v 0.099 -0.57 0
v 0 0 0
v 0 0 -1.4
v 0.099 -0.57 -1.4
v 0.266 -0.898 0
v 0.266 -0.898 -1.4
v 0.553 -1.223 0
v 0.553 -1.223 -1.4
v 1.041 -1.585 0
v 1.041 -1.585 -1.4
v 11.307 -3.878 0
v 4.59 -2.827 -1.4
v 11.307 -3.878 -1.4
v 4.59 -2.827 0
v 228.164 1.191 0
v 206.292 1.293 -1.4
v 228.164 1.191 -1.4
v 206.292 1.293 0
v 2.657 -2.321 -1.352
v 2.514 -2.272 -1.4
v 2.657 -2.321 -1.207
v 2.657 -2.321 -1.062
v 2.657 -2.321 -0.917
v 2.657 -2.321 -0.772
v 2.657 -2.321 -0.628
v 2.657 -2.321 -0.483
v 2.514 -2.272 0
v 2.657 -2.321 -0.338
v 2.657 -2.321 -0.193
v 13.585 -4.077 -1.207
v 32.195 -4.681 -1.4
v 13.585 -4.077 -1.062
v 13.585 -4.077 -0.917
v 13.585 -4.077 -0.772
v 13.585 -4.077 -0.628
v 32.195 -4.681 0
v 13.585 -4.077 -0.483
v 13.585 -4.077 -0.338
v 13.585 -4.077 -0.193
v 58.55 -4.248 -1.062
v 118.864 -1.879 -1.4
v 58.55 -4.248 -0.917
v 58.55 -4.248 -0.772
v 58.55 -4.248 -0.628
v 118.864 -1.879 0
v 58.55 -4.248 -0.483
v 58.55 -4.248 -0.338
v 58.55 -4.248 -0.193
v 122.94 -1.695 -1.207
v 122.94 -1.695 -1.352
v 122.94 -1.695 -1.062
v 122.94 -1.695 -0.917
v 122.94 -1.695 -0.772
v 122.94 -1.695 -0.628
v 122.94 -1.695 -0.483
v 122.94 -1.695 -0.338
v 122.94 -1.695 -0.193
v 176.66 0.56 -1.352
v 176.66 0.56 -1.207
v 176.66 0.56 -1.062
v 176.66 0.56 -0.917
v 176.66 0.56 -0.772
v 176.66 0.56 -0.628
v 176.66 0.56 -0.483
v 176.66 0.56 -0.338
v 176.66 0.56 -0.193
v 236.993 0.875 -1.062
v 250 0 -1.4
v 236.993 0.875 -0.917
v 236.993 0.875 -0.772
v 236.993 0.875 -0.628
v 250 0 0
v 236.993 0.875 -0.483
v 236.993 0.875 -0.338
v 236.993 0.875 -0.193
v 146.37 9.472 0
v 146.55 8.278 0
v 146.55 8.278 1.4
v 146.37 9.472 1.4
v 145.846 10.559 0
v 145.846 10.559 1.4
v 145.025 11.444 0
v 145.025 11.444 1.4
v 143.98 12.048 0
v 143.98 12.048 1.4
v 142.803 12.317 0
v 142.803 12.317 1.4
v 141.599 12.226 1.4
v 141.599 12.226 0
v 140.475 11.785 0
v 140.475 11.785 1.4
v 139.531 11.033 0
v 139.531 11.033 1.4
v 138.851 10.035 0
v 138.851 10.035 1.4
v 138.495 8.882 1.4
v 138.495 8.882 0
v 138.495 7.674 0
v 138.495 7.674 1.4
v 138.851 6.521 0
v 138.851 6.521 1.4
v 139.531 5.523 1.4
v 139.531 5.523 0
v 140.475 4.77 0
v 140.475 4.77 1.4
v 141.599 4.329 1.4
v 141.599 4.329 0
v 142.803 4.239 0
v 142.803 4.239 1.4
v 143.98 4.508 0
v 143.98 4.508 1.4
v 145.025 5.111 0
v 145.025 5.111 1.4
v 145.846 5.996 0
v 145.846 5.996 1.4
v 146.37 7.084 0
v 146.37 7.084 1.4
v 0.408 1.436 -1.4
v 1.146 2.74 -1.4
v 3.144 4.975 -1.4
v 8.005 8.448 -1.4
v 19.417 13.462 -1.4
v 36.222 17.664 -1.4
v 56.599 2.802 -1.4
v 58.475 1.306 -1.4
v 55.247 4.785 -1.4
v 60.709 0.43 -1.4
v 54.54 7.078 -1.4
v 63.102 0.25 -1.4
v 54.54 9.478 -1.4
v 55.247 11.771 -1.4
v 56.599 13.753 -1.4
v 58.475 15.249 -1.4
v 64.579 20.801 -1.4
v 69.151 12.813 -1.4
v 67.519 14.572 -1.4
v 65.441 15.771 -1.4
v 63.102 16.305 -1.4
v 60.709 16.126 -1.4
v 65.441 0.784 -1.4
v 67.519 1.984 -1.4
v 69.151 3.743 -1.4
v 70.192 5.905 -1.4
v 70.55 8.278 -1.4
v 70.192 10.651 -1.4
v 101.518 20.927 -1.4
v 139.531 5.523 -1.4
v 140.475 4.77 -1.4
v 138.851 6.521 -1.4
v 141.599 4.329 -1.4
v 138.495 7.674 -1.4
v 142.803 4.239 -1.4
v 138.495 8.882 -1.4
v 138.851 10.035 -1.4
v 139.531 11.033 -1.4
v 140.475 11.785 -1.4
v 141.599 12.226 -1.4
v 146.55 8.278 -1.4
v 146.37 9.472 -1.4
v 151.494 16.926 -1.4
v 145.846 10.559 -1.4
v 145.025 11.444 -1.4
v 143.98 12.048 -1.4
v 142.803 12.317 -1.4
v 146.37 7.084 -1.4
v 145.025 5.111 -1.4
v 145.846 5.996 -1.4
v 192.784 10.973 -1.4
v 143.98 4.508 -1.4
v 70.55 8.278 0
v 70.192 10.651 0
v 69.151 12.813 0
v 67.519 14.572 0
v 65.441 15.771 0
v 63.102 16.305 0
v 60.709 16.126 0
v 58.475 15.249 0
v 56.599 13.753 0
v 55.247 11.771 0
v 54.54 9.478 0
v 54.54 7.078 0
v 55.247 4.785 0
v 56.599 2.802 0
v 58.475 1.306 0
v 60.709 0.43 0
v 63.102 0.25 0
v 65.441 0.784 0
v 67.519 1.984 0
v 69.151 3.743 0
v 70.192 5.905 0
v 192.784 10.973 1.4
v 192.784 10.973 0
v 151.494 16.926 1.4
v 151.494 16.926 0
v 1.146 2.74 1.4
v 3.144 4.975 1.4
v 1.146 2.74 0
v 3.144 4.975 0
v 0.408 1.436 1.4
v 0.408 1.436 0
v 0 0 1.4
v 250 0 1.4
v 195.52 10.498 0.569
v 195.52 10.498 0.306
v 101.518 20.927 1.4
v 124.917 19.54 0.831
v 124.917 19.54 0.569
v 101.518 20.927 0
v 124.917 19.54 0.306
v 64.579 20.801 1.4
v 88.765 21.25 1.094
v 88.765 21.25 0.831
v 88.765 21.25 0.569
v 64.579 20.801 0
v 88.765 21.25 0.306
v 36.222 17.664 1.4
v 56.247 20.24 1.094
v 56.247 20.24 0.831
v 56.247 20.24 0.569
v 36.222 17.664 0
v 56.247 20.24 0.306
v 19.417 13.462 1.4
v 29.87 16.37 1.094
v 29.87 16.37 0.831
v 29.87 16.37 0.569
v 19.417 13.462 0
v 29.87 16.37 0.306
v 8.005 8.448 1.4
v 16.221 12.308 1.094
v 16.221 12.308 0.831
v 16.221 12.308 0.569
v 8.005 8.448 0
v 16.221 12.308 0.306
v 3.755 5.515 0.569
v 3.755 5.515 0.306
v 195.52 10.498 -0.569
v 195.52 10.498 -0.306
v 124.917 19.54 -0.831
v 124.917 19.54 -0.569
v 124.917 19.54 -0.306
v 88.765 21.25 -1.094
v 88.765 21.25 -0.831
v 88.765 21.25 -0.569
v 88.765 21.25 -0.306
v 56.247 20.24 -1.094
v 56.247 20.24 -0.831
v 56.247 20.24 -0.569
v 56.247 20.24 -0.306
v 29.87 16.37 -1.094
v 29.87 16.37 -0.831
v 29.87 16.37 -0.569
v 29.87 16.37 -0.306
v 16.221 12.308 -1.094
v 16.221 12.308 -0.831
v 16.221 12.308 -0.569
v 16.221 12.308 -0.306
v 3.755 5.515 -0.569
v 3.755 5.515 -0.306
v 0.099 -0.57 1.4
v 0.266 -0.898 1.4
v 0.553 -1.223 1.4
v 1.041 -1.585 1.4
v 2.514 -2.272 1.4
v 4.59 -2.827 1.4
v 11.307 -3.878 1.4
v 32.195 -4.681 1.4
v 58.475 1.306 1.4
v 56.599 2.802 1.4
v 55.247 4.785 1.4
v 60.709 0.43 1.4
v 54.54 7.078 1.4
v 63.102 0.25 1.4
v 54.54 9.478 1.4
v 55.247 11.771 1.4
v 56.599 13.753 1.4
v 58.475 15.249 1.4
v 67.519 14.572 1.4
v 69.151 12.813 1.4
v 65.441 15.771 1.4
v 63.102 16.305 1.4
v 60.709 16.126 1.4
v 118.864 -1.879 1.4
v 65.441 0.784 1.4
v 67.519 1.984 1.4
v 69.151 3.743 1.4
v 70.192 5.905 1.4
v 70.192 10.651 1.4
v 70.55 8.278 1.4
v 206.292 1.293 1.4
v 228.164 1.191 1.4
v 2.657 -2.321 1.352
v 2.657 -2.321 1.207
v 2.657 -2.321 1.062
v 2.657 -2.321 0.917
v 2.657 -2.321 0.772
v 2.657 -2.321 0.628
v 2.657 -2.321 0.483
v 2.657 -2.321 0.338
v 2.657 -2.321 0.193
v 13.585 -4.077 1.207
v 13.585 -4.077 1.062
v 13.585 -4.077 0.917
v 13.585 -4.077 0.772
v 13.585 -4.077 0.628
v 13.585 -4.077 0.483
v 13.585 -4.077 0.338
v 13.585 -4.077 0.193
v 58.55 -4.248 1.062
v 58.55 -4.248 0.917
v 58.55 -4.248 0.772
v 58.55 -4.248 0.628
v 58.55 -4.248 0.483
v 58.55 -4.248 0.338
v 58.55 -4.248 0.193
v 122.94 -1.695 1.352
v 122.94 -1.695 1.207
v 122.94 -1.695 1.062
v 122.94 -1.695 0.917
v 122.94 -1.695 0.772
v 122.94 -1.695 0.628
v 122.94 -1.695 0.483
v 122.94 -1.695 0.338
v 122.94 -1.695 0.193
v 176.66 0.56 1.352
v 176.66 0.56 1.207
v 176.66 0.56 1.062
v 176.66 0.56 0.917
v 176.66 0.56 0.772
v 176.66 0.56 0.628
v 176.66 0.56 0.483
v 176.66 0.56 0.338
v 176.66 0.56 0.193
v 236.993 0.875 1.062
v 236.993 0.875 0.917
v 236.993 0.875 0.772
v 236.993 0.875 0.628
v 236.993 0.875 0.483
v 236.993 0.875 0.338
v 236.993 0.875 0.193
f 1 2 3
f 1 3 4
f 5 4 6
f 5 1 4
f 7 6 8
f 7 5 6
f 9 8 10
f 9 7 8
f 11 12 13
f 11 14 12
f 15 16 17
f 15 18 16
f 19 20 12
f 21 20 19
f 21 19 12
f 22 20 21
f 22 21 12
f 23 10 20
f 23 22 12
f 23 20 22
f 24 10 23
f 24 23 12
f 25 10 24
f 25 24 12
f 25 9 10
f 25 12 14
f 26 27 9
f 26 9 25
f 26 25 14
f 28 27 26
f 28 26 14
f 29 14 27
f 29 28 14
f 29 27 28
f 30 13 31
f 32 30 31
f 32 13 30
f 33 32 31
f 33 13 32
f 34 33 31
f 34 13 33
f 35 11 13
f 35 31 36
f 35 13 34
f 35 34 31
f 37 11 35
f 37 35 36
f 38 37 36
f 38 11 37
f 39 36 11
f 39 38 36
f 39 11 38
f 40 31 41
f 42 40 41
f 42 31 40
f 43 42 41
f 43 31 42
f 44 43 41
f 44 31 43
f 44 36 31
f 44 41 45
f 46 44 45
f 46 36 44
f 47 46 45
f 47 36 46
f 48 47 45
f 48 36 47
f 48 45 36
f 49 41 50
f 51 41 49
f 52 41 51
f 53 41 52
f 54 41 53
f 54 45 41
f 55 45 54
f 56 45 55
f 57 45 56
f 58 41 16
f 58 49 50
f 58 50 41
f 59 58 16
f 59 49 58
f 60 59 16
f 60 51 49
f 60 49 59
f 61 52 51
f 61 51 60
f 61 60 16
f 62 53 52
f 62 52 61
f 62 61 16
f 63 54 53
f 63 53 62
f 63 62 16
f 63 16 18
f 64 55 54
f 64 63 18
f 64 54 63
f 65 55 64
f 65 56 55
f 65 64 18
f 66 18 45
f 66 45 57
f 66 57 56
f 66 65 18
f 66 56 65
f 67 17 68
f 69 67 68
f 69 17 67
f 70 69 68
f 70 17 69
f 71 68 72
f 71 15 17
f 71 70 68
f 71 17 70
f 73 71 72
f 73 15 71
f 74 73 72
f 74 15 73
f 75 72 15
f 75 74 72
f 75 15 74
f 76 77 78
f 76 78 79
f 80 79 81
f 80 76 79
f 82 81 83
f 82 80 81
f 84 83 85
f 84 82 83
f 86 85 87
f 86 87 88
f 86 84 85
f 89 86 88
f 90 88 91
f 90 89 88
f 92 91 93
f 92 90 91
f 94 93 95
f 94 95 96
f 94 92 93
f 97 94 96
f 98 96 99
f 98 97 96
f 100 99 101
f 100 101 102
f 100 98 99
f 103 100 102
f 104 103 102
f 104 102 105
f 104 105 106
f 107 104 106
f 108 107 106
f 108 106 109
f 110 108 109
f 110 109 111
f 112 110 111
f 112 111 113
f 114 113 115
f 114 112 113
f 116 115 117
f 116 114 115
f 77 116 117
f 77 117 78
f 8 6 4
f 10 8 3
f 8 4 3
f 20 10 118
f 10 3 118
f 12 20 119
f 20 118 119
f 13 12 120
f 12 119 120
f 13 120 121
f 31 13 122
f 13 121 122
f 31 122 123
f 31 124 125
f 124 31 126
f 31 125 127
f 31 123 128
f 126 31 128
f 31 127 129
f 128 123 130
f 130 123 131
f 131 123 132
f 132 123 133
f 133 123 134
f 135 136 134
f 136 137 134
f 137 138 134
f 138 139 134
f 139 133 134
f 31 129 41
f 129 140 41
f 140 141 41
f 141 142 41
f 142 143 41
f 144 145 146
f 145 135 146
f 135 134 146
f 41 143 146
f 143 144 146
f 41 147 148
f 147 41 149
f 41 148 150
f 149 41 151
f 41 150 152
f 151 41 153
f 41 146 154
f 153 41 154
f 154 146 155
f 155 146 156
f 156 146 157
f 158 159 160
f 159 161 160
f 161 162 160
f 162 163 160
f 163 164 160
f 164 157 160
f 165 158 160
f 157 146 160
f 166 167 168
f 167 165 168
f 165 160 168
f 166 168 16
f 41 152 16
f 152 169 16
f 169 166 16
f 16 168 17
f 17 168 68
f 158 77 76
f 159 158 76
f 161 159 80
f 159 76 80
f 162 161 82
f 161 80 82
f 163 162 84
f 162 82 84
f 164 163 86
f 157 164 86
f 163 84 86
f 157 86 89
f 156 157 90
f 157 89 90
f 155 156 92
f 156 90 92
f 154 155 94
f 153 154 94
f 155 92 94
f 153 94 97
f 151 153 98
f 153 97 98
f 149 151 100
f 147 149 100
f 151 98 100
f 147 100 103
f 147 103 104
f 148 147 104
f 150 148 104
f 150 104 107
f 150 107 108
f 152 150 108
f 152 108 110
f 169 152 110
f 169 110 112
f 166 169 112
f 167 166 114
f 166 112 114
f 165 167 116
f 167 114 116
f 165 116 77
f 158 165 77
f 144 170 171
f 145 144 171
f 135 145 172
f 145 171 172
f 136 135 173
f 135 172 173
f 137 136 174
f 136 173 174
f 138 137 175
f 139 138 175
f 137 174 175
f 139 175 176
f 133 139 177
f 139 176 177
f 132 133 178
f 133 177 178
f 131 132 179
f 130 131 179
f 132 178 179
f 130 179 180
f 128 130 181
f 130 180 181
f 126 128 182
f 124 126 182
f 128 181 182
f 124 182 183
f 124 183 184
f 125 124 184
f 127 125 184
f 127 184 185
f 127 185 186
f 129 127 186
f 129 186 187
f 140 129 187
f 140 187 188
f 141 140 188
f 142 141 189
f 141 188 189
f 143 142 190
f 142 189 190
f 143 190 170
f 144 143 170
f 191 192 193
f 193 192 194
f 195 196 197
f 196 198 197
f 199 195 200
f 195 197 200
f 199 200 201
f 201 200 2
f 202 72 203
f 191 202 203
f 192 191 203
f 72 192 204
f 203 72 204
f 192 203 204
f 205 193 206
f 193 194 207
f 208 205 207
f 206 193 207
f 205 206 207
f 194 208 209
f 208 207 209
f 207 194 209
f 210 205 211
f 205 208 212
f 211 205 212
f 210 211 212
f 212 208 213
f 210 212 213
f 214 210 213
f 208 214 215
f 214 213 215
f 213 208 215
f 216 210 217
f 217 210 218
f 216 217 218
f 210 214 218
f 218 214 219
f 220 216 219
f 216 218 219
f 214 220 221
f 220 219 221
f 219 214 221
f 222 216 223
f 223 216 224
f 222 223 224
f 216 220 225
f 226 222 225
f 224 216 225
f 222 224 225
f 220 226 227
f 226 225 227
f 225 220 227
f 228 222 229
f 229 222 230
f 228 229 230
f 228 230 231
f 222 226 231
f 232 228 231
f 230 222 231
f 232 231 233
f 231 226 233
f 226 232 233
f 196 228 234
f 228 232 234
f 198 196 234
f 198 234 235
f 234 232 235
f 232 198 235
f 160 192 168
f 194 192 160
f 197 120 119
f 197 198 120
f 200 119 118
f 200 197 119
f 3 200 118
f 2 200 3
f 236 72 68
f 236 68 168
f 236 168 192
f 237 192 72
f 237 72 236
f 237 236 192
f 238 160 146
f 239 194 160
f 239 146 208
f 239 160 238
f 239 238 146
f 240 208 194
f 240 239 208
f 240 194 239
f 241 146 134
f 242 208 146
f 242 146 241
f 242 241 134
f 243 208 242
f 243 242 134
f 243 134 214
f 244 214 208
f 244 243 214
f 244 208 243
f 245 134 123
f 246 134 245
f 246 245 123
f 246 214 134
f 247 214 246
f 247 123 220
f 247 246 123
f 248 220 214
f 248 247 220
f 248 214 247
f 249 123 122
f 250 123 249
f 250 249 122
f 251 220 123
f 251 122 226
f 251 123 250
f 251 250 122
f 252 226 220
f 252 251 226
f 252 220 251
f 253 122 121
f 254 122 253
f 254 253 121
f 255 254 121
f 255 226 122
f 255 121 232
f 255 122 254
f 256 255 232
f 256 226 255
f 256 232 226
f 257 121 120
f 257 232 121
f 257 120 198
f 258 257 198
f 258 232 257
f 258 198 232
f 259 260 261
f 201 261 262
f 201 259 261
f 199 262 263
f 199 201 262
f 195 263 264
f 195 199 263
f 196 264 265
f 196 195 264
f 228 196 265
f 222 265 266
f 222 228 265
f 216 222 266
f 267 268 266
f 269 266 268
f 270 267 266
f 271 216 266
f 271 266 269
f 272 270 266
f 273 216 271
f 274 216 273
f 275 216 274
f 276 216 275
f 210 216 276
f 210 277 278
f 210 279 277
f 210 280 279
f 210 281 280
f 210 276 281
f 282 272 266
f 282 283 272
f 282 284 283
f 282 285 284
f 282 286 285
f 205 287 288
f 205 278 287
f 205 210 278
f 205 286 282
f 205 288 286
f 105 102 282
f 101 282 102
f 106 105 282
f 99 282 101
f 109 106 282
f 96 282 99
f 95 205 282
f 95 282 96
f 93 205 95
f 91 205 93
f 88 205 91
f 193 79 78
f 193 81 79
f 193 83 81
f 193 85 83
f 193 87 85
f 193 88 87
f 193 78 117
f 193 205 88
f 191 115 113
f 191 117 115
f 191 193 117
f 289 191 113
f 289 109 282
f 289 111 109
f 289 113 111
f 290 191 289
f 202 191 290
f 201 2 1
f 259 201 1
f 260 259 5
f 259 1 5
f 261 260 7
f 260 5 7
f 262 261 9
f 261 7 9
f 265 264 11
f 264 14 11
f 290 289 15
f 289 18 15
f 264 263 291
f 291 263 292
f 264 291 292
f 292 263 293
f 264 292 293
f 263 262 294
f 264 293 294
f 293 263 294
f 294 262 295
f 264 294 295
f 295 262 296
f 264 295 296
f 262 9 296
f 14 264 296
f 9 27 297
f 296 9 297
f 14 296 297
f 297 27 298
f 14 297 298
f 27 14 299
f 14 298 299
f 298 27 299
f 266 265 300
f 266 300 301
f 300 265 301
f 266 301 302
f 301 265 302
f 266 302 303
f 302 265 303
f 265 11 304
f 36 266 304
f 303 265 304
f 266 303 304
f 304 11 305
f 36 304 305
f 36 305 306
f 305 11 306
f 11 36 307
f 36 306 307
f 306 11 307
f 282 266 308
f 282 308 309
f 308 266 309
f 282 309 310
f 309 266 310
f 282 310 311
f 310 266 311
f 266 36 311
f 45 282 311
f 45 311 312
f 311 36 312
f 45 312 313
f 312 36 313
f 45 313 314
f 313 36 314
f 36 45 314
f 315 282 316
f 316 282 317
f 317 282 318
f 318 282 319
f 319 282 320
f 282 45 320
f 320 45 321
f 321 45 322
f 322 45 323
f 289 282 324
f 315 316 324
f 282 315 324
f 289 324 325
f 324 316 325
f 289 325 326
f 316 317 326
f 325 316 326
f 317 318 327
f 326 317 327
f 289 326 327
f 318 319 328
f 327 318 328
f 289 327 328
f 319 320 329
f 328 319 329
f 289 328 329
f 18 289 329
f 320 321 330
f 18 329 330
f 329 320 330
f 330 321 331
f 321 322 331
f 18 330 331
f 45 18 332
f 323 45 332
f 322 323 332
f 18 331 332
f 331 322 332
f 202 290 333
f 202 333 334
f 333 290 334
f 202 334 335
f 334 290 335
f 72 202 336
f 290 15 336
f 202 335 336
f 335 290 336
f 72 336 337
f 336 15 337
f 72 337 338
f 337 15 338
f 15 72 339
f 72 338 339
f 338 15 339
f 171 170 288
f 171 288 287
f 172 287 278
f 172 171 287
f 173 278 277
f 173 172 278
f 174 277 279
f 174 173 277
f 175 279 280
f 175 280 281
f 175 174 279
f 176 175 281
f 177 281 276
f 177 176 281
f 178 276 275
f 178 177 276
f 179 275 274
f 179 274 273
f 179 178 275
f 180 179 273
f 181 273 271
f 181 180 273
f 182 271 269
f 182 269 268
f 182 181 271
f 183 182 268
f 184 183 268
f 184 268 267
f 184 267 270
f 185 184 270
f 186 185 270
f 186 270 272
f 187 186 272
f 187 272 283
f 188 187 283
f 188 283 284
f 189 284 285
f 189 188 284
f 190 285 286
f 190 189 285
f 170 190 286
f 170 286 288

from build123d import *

# Parameters (mm, degrees)
SKETCH_1_R      = 8.05
SKETCH_1_R_2    = 4.05
EXTRUDE_1_DEPTH = 1.4


with BuildPart() as part:
    # Эскиз1 → Бобышка-Вытянуть1 (new, symmetric)
    with BuildSketch(Plane.XY):
        with BuildLine():
            add(Edge.make_bspline(
                [(0, 0), (0.018871718, -0.191458654), (0.095089169, -0.964705177), (1.706152902, -2.107027665), (4.500087477, -2.851769067), (8.687459942, -3.644061995), (14.135657503, -4.15912967), (20.848112012, -4.523549846), (28.752907792, -4.688514126), (37.779795609, -4.689041954), (47.837831161, -4.538039503), (58.820306374, -4.251921588), (70.60679251, -3.868608025), (83.06010153, -3.409033778), (96.035635701, -2.879346251), (109.387239837, -2.306383388), (122.965978931, -1.694860333), (136.622137743, -1.073639089), (150.199115392, -0.470922151), (163.53658295, 0.076551628), (176.471135172, 0.566798188), (188.841099972, 0.957639353), (200.483907746, 1.228143059), (211.234601881, 1.358189011), (220.926690721, 1.347697775), (229.39612438, 1.180923212), (236.49675891, 0.917479418), (242.114506532, 0.607102556), (246.175281813, 0.33307026), (248.628885905, 0.125433469), (249.725014491, 0.025156467), (250, 0)],
                knots=[0, 0, 0, 0, 0.002249682, 0.00908582, 0.020842106, 0.037635477, 0.059467466, 0.086252011, 0.117796132, 0.153826565, 0.193968214, 0.237839145, 0.284932658, 0.334700791, 0.386556231, 0.439909987, 0.494183894, 0.548767569, 0.603049647, 0.656369422, 0.708069227, 0.757519447, 0.804063608, 0.847048373, 0.88582367, 0.91972266, 0.948135678, 0.970615183, 0.986864288, 0.996704647, 1, 1, 1, 1], degree=3))
            add(Edge.make_bspline(
                [(250, 0), (249.728268944, 0.039573403), (248.652871383, 0.196188336), (246.279462903, 0.587177037), (242.428352959, 1.288360809), (237.222865341, 2.309386038), (230.793827799, 3.623444219), (223.269926583, 5.171874609), (214.774490127, 6.895172568), (205.42146764, 8.714760581), (195.315832501, 10.557958922), (184.559706128, 12.367831659), (173.257486693, 14.098275825), (161.523700661, 15.718292983), (149.477836757, 17.191140895), (137.244702141, 18.489945542), (124.948445657, 19.576972699), (112.713330041, 20.423484935), (100.660093739, 21.0051416), (88.90263645, 21.29794381), (77.55000993, 21.289164114), (66.705214259, 20.964670685), (56.462895388, 20.320583614), (46.904588499, 19.355972032), (38.102679916, 18.064146226), (30.116269619, 16.50245056), (22.997877518, 14.677376208), (16.795613257, 12.610458157), (11.527567398, 10.390923155), (7.227335291, 8.085166418), (3.899950905, 5.771078051), (1.601065908, 3.503870395), (0.335220365, 1.556233861), (0.081503465, 0.378373349), (0, 0)],
                knots=[0, 0, 0, 0, 0.003200295, 0.012665426, 0.028031529, 0.048819787, 0.074487746, 0.104508209, 0.138345414, 0.1755145, 0.215555464, 0.25806197, 0.302630363, 0.348808108, 0.396106186, 0.444059496, 0.492174764, 0.539964556, 0.586986035, 0.632802121, 0.677021564, 0.719279722, 0.759229813, 0.796603314, 0.83121054, 0.862874453, 0.89140365, 0.916793752, 0.939002545, 0.957938568, 0.973592366, 0.986016263, 0.995507895, 1, 1, 1, 1], degree=3))
        make_face()
        with Locations((62.5, 8.277885291)):
            Circle(SKETCH_1_R, mode=Mode.SUBTRACT)
        with Locations((142.5, 8.277885291)):
            Circle(SKETCH_1_R_2, mode=Mode.SUBTRACT)
    extrude(amount=EXTRUDE_1_DEPTH, both=True)


solid = part.part
